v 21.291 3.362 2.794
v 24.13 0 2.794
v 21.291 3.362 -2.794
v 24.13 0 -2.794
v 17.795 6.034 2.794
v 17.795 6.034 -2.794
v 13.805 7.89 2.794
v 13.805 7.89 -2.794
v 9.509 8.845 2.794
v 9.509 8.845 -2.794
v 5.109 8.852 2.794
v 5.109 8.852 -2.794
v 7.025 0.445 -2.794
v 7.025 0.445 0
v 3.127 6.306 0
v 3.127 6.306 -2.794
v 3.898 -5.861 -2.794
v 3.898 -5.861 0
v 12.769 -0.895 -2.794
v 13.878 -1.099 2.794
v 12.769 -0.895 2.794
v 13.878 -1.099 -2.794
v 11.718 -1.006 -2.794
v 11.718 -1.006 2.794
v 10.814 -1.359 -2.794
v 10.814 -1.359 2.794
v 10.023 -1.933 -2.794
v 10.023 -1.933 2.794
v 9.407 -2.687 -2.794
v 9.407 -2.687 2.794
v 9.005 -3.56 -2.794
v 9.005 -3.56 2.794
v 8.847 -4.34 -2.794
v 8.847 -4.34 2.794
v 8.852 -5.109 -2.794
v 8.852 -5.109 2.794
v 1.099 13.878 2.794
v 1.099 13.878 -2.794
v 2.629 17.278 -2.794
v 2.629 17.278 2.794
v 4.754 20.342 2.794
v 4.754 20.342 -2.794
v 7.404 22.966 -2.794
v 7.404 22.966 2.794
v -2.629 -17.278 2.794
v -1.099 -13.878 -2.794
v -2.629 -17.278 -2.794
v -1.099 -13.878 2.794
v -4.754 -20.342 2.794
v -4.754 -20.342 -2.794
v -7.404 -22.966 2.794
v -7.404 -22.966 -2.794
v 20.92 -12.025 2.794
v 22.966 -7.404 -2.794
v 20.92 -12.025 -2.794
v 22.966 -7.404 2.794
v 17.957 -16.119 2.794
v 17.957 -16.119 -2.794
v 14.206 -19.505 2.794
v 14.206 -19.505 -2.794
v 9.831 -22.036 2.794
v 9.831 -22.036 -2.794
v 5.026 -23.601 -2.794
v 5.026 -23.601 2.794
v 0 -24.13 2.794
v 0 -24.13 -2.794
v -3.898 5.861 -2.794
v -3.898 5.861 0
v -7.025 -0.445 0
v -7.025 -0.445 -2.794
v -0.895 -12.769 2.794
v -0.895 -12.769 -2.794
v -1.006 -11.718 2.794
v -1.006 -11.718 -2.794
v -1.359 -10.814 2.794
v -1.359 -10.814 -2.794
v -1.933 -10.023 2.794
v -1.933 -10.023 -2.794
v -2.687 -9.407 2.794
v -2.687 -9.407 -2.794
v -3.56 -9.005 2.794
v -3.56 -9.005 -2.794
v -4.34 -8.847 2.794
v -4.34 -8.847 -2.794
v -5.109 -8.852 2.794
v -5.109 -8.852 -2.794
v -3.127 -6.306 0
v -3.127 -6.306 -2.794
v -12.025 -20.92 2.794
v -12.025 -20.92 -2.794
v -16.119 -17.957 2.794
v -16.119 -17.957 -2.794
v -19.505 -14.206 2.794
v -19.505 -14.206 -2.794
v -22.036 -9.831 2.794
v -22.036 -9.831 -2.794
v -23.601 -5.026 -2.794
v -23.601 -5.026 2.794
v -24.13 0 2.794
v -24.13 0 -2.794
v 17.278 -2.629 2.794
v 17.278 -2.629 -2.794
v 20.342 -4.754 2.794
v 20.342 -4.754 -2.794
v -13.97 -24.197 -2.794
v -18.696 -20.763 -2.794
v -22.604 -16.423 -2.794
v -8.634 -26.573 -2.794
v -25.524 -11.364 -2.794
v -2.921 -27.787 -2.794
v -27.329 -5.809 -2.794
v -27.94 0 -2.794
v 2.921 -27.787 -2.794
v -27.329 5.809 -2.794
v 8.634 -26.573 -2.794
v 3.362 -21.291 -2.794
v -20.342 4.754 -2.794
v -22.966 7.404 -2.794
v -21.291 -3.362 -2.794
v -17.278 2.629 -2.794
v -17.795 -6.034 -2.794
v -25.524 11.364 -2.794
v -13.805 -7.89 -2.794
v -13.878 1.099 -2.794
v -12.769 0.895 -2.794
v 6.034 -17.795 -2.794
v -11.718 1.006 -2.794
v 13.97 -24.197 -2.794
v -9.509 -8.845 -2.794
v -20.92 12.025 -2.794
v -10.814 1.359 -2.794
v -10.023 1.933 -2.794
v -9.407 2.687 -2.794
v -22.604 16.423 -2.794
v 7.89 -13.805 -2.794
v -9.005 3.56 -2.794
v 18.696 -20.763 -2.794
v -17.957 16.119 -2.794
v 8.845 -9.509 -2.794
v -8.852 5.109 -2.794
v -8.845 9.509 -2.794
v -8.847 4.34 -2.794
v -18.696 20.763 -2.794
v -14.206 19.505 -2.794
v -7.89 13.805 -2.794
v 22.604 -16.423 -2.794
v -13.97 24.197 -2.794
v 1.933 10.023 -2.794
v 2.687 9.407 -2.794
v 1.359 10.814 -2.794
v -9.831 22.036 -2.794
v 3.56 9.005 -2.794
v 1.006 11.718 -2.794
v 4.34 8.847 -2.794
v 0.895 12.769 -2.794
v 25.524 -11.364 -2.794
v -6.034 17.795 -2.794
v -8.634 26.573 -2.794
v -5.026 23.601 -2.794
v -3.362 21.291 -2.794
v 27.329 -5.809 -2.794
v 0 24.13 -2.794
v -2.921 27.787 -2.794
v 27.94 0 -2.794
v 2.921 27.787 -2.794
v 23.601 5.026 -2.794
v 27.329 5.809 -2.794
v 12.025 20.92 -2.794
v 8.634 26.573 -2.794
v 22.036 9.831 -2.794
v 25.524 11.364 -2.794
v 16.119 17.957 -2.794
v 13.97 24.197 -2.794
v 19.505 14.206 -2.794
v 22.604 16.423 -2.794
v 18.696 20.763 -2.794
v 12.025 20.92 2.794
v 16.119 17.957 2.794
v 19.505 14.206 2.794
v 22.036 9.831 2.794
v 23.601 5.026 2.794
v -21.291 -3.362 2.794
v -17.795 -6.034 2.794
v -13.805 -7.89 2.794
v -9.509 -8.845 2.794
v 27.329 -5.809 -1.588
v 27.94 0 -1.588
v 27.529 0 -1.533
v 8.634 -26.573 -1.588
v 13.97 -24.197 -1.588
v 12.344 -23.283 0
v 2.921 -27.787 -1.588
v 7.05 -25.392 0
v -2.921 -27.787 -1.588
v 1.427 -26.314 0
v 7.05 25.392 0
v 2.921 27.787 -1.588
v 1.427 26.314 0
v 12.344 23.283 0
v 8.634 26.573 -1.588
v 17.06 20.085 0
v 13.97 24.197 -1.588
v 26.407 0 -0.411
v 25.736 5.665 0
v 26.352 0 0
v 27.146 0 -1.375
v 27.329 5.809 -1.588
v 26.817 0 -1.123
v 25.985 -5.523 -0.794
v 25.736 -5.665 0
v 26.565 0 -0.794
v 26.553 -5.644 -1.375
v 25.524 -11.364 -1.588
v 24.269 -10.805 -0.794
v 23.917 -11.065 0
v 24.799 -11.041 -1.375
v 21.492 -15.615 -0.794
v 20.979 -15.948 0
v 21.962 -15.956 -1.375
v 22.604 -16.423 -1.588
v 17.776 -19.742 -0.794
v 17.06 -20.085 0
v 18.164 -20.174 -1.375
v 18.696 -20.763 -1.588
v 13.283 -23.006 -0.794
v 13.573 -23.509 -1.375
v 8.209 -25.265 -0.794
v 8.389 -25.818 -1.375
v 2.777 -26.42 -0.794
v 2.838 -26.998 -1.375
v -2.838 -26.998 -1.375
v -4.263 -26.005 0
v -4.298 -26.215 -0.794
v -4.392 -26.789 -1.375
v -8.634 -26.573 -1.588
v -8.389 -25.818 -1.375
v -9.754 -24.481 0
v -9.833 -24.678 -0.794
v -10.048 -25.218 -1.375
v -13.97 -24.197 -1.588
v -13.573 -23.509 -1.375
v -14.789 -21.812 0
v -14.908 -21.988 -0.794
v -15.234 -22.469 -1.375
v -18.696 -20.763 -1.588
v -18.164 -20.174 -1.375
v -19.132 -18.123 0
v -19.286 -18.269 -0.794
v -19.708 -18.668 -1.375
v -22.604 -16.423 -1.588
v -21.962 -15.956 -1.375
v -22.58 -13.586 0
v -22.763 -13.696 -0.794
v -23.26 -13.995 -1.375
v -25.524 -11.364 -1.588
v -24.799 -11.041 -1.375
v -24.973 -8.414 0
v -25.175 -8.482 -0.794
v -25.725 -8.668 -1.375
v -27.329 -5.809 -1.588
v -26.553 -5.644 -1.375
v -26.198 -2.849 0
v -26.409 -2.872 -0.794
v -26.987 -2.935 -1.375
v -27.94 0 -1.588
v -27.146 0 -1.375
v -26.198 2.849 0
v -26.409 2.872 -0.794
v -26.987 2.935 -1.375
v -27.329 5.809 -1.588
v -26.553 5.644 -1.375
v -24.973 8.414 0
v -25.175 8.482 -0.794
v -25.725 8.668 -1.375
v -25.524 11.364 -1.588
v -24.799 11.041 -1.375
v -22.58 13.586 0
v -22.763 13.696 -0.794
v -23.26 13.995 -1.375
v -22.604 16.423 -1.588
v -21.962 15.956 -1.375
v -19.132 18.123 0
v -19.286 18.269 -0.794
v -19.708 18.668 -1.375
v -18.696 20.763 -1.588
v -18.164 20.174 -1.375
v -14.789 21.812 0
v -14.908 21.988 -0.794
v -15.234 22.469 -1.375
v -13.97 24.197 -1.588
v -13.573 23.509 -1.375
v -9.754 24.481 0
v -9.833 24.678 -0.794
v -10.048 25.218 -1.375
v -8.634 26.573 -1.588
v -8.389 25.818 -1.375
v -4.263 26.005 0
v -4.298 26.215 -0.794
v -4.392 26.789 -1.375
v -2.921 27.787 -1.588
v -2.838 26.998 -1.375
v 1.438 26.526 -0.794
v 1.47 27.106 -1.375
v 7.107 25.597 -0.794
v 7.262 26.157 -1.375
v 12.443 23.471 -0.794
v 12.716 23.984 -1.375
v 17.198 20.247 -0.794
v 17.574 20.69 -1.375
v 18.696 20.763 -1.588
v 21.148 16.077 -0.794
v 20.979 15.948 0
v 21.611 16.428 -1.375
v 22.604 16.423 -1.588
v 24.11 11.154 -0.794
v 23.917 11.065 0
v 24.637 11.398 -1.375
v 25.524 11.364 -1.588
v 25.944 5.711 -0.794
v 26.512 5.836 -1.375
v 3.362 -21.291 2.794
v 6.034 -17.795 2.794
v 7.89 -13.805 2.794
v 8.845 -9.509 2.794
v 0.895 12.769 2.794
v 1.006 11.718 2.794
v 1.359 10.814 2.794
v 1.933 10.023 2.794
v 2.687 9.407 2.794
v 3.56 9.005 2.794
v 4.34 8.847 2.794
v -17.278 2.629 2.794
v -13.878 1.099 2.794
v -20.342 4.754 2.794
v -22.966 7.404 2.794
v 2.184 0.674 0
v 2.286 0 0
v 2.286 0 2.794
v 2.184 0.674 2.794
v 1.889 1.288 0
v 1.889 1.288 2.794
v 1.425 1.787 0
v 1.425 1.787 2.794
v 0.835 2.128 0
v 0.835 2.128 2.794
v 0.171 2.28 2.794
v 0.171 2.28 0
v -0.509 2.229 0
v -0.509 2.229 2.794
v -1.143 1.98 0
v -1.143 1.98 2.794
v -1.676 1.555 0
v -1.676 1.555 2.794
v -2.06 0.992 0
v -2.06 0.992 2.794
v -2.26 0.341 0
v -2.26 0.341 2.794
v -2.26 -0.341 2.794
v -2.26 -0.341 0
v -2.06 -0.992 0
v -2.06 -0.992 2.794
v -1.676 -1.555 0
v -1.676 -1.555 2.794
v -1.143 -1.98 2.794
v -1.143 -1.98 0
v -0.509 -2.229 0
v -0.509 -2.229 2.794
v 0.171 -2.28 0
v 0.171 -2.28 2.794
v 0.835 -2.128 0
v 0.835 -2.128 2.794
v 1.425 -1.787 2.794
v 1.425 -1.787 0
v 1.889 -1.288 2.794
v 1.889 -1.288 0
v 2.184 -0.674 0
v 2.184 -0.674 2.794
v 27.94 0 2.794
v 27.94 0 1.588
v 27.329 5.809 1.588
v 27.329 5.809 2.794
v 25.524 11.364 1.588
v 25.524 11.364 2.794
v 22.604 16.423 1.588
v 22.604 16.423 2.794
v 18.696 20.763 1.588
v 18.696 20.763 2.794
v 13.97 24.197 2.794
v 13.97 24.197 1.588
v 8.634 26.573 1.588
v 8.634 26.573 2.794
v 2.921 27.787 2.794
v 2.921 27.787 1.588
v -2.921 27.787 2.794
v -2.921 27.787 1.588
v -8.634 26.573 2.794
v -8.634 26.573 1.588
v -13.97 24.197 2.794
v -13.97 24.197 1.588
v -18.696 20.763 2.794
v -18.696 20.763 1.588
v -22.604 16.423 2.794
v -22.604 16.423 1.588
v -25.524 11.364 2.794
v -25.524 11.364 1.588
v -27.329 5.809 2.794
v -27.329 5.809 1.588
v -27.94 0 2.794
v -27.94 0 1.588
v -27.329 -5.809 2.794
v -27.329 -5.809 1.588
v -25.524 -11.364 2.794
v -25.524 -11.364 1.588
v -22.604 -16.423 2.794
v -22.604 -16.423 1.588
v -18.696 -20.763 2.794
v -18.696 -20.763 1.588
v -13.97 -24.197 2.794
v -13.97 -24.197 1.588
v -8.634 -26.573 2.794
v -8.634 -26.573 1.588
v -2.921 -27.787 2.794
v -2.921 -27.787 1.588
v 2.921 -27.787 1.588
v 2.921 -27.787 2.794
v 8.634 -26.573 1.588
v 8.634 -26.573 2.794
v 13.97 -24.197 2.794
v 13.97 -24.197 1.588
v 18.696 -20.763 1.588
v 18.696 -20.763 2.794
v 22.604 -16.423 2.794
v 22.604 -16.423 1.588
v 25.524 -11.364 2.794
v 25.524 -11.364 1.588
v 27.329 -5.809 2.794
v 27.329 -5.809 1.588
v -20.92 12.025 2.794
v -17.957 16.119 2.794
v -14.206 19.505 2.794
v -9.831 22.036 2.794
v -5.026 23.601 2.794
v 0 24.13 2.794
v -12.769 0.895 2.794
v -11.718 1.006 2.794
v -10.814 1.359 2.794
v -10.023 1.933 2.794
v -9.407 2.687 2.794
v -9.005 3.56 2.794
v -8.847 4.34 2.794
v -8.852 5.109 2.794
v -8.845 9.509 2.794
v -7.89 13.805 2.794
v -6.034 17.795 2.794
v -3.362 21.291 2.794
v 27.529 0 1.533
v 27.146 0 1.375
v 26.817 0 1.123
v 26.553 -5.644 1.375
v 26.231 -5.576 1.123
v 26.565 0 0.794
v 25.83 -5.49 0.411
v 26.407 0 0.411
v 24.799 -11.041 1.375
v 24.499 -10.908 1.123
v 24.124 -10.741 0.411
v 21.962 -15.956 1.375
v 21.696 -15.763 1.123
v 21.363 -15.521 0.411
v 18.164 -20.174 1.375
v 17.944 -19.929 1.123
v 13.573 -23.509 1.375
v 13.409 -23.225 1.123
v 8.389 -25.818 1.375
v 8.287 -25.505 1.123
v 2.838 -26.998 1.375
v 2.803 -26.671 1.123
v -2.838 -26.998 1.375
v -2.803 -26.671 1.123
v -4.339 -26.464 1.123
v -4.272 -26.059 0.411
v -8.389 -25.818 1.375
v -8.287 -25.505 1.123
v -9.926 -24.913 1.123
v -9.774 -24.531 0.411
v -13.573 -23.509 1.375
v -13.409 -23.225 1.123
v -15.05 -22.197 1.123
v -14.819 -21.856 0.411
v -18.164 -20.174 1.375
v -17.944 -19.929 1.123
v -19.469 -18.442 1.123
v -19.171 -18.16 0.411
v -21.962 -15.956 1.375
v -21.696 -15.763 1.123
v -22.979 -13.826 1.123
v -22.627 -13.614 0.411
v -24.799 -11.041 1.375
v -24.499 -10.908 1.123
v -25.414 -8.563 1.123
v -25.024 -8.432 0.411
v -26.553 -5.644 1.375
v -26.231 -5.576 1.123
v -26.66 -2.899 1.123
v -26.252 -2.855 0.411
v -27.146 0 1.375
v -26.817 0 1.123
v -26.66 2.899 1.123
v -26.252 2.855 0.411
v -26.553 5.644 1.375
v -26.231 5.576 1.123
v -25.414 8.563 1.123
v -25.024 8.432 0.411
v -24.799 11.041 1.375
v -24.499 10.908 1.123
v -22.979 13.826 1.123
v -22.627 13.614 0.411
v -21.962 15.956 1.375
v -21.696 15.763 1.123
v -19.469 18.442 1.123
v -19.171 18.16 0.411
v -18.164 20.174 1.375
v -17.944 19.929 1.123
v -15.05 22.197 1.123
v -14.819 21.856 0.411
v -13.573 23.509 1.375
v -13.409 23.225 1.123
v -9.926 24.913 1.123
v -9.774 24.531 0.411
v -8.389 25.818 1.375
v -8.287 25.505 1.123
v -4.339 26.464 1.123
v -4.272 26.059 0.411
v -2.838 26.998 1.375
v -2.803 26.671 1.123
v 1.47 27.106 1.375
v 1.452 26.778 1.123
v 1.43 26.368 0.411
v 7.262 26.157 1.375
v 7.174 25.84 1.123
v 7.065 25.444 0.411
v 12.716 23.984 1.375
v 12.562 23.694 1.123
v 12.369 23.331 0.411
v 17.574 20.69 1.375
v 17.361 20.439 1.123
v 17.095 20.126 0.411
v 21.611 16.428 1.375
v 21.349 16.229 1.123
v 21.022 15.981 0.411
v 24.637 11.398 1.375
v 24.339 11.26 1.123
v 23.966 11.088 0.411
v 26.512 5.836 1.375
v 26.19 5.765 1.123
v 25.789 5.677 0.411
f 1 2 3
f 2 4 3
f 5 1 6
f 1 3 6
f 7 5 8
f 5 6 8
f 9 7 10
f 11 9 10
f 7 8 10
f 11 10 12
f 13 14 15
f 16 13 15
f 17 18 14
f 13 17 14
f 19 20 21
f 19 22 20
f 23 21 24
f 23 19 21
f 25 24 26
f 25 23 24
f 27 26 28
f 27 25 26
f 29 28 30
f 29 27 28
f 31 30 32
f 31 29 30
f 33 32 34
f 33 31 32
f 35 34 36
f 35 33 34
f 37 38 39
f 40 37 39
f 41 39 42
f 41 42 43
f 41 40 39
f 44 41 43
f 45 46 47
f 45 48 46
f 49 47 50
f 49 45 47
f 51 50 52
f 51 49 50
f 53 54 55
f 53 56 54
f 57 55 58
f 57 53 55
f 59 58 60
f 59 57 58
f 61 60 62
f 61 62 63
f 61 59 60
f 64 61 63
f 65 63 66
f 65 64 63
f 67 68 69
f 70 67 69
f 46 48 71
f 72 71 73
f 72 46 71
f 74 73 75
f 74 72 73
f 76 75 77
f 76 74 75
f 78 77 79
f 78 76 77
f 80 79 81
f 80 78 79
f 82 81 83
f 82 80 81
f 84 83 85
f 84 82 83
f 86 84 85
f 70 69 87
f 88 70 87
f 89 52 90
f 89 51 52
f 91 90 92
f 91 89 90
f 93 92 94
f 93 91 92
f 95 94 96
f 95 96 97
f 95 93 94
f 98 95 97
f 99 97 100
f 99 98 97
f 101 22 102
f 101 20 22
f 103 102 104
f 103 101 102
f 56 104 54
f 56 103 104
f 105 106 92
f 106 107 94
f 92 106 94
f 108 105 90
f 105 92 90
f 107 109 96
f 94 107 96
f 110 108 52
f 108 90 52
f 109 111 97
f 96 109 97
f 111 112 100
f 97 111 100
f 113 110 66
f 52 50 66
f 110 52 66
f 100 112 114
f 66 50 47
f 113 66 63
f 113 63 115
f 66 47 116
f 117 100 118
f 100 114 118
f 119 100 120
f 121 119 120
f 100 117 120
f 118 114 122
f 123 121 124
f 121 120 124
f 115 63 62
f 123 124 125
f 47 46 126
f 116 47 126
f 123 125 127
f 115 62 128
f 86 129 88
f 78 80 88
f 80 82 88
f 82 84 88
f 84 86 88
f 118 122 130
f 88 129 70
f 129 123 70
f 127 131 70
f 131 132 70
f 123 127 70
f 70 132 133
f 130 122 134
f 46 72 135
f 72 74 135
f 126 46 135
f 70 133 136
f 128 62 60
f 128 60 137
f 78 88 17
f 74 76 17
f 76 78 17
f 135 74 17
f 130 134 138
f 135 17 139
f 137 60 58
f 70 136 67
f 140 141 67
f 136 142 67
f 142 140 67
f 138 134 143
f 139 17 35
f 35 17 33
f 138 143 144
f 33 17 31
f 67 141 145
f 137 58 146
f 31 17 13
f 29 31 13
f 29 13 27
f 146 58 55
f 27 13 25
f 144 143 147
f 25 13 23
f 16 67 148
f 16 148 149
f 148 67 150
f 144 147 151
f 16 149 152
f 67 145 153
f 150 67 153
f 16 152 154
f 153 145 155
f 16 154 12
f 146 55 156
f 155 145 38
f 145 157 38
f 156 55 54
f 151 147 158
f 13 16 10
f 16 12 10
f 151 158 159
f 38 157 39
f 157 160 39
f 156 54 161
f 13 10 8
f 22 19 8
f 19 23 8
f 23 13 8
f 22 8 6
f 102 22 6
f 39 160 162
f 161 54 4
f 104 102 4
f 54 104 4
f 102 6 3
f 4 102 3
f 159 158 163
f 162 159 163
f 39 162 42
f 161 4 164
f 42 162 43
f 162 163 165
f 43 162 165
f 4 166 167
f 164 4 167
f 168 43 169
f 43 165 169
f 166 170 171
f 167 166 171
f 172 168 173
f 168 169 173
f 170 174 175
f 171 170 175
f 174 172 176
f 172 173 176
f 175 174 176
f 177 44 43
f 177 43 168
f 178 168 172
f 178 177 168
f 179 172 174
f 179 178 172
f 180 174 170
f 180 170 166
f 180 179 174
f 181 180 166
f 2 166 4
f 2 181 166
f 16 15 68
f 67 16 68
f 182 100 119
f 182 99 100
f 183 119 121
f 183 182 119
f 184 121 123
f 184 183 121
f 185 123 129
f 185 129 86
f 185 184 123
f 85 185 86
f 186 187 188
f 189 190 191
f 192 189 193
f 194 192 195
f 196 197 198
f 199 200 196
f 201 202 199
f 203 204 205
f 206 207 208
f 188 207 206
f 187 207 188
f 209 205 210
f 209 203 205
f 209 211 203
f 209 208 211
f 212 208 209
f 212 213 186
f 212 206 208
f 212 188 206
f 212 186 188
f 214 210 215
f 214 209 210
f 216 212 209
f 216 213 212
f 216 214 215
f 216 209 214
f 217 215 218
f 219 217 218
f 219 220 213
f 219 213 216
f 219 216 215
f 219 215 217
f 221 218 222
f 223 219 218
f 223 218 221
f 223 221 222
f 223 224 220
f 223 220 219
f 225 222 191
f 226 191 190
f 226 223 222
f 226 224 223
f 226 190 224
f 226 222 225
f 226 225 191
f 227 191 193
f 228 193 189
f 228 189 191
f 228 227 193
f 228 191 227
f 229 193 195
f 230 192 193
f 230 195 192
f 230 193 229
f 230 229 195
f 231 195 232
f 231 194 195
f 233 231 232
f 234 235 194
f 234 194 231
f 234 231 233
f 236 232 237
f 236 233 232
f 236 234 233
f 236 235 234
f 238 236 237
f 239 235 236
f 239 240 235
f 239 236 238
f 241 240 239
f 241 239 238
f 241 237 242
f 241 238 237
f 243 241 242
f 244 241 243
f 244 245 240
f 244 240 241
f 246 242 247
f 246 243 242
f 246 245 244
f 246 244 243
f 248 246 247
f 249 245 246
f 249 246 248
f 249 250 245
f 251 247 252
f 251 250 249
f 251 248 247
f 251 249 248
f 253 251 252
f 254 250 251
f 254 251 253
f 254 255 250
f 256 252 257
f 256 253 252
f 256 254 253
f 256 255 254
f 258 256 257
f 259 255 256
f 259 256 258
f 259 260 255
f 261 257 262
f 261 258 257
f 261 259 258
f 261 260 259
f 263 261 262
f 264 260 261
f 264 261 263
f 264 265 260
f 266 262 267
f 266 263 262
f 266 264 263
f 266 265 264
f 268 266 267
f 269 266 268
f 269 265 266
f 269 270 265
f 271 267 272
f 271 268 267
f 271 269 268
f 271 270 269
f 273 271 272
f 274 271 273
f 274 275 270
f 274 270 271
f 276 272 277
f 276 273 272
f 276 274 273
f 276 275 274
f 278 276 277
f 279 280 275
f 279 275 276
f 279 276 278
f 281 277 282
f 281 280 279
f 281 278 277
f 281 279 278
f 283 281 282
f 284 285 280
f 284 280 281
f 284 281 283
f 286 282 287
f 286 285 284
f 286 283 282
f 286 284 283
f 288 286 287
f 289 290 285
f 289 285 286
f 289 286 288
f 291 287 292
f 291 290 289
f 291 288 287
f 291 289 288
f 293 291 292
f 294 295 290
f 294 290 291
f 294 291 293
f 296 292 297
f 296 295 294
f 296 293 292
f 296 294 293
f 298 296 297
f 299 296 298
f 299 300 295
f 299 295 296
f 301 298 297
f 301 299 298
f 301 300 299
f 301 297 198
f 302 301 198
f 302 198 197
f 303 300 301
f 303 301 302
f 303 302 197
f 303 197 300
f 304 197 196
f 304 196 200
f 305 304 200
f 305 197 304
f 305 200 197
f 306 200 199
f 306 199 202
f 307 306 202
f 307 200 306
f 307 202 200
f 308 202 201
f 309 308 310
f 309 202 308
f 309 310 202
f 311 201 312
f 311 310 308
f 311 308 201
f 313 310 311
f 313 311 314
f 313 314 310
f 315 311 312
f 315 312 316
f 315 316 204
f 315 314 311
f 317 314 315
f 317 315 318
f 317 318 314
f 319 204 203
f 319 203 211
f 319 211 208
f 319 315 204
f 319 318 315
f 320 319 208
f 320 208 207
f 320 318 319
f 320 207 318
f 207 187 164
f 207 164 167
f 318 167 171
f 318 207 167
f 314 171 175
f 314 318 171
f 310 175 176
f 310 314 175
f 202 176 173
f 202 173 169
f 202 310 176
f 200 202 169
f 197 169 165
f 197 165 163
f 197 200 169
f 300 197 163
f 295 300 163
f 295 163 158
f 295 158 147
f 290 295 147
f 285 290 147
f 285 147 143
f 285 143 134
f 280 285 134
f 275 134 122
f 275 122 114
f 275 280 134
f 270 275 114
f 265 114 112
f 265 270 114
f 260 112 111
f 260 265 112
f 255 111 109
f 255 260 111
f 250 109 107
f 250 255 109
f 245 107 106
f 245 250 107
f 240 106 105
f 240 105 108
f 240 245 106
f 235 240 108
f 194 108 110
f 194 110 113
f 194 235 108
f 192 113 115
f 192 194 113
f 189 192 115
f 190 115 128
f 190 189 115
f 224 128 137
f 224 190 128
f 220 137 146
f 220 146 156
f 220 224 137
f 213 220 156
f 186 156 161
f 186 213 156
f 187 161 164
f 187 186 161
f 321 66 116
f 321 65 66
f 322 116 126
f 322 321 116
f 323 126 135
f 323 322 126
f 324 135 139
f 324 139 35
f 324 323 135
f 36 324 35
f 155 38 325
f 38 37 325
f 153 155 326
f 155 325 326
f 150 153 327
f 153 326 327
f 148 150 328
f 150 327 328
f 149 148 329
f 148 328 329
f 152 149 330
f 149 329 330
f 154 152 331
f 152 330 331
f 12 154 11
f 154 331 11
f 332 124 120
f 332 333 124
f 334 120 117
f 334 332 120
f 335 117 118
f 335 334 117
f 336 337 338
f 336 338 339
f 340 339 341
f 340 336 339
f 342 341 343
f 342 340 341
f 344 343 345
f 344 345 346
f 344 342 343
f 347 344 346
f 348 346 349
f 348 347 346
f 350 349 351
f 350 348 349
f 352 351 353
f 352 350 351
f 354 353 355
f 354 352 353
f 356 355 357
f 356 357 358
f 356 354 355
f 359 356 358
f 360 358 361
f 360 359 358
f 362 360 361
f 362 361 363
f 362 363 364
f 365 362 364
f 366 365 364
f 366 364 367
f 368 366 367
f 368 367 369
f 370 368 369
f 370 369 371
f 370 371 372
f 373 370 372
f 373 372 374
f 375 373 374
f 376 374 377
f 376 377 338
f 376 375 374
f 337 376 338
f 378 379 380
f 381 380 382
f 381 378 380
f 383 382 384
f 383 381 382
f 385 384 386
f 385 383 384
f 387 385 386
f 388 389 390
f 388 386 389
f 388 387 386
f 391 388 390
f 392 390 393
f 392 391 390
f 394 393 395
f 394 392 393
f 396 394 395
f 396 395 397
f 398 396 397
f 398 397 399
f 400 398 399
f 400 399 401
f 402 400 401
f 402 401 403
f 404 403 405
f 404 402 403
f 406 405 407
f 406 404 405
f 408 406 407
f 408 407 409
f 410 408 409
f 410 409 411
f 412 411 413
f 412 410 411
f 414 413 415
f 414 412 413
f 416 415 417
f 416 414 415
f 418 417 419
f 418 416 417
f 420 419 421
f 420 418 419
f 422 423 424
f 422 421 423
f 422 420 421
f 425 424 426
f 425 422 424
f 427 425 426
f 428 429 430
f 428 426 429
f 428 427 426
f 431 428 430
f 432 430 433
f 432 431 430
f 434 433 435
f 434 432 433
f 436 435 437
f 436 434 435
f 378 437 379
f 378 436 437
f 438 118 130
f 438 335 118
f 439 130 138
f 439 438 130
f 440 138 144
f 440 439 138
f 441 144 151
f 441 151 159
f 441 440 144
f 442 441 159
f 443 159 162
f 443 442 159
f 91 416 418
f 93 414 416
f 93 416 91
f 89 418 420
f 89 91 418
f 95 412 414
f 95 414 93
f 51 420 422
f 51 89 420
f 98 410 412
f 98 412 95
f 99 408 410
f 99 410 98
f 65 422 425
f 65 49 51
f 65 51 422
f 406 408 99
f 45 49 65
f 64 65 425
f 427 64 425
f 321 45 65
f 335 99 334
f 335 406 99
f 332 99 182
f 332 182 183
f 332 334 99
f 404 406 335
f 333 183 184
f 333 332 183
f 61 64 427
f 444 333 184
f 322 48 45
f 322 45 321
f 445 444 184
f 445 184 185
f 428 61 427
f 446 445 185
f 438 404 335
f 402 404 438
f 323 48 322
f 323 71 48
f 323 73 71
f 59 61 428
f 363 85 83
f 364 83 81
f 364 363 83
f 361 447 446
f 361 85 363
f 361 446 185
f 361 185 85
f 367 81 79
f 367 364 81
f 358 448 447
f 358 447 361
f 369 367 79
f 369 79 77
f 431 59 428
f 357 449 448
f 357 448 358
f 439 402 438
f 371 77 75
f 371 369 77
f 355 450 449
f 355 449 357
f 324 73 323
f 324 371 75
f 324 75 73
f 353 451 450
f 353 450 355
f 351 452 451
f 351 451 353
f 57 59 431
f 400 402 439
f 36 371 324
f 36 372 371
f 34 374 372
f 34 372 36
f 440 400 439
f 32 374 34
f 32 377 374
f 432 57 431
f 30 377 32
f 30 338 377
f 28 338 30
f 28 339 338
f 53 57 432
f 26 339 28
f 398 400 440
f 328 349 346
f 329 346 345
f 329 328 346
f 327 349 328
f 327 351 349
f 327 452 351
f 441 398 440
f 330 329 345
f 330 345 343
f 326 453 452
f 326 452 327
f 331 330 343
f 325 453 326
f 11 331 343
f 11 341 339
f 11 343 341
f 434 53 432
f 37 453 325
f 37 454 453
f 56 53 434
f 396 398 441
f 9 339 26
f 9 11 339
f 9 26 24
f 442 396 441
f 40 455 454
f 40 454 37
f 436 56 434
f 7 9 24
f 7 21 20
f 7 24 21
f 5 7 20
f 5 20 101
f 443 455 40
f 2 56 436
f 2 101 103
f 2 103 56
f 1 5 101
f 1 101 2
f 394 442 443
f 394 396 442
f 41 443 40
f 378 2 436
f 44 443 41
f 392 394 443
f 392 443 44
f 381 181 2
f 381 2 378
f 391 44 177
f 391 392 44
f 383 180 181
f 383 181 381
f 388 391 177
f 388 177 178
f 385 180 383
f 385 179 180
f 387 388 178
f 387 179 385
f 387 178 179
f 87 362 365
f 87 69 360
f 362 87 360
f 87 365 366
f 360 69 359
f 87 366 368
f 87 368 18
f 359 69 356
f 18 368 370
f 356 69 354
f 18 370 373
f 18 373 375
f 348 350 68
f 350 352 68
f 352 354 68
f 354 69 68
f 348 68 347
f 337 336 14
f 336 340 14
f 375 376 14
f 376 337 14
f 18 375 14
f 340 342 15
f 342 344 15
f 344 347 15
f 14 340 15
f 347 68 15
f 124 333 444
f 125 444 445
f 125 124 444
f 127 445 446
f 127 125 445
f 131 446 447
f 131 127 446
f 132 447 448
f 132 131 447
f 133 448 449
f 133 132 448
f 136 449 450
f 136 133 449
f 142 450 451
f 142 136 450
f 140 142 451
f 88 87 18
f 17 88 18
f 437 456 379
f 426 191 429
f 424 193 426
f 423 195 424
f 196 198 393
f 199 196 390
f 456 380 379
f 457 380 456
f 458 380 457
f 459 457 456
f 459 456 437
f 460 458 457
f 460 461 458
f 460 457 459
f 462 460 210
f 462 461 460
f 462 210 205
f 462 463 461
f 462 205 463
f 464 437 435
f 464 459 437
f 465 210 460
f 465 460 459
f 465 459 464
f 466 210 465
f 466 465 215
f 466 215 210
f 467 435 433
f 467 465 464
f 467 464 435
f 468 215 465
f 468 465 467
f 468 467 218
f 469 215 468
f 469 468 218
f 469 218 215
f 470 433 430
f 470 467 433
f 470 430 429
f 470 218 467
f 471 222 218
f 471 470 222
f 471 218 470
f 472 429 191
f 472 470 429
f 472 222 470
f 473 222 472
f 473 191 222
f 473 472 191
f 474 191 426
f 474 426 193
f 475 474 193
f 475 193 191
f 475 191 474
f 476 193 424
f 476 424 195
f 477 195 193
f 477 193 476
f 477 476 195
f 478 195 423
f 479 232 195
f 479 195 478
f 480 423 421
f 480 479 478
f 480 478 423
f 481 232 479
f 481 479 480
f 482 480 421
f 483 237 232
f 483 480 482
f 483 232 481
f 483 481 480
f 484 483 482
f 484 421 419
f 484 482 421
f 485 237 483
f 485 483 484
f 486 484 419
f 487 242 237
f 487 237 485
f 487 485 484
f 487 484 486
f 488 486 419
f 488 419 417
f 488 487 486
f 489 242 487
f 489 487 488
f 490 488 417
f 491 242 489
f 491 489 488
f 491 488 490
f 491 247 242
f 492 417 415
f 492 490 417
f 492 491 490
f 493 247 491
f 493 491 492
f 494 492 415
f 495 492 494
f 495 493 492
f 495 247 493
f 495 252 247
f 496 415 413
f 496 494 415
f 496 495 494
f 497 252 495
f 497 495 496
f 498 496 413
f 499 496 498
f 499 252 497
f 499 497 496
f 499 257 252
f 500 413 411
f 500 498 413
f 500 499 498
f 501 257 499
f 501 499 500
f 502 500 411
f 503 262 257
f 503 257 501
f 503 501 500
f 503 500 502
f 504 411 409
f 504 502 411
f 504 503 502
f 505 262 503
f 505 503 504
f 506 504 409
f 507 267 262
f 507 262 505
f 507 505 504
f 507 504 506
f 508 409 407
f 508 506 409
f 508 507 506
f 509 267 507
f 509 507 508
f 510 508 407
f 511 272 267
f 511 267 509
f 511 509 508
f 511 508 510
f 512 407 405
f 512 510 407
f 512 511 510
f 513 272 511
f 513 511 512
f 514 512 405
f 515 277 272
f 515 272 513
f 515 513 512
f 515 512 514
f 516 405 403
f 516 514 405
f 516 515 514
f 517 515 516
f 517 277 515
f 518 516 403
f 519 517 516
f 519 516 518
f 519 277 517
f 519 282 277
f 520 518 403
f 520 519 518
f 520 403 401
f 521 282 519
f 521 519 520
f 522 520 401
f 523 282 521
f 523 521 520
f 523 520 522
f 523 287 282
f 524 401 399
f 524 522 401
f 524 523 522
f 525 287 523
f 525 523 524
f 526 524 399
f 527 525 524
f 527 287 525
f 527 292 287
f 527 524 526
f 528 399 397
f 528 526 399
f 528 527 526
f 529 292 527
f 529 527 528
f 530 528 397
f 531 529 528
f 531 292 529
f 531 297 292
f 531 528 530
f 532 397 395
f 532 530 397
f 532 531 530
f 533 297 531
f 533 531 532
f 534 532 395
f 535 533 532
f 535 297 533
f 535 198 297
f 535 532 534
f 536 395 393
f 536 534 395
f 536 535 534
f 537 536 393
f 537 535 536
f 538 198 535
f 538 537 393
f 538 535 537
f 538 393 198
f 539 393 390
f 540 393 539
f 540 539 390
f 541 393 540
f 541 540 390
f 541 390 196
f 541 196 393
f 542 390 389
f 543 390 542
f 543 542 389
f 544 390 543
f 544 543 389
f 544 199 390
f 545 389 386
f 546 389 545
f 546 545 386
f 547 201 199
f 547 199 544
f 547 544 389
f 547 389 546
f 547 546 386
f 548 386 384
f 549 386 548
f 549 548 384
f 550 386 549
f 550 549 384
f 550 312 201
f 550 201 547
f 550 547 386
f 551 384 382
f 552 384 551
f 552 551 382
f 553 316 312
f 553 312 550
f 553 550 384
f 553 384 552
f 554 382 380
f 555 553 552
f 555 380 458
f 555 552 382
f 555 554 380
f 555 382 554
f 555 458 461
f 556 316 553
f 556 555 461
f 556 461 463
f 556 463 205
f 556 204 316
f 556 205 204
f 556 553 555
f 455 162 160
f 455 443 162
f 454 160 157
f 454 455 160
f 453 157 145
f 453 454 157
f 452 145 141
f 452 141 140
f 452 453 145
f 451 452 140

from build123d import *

# Parameters (mm, degrees)
F0_R     = 27.94
F0_R_2   = 2.286
F1_DEPTH = 2.794
F4_R     = 3.81
F5_DEPTH = 12.7


# Not quite as in the source:
# - a feature names something its author has since deleted; it is built from what else it names


with BuildPart() as f1:
    # F0 (on Top) → F1 (new body, symmetric)
    with BuildSketch(Plane.XY):
        Circle(F0_R)
        with BuildLine():
            ThreePointArc((7.4038372238, 22.9660639719), (19.5052748277, 14.2056732996), (24.13, 0))
            ThreePointArc((24.13, 0), (23.8372400211, -3.7473841781), (22.9660639719, -7.4038372238))
            ThreePointArc((22.9660639719, -7.4038372238), (14.2056732996, -19.5052748277), (0, -24.13))
            ThreePointArc((0, -24.13), (-3.7473841781, -23.8372400211), (-7.4038372238, -22.9660639719))
            ThreePointArc((-7.4038372238, -22.9660639719), (-19.5052748277, -14.2056732996), (-24.13, 0))
            ThreePointArc((-24.13, 0), (-23.8372400211, 3.7473841781), (-22.9660639719, 7.4038372238))
            ThreePointArc((-22.9660639719, 7.4038372238), (-14.2056732996, 19.5052748277), (0, 24.13))
            ThreePointArc((0, 24.13), (3.7473841781, 23.8372400211), (7.4038372238, 22.9660639719))
        make_face(mode=Mode.SUBTRACT)
        with BuildLine():
            ThreePointArc((22.9660639719, -7.4038372238), (23.8372400211, -3.7473841781), (24.13, 0))
            ThreePointArc((24.13, 0), (13.395886303, 8.0244732927), (0, 7.62))
            ThreePointArc((0, 7.62), (2.0157431704, 16.1065414645), (7.4038372238, 22.9660639719))
            ThreePointArc((7.4038372238, 22.9660639719), (3.7473841781, 23.8372400211), (0, 24.13))
            ThreePointArc((0, 24.13), (-8.0244732927, 13.395886303), (-7.62, 0))
            ThreePointArc((-7.62, 0), (-16.1065414645, 2.0157431704), (-22.9660639719, 7.4038372238))
            ThreePointArc((-22.9660639719, 7.4038372238), (-23.8372400211, 3.7473841781), (-24.13, 0))
            ThreePointArc((-24.13, 0), (-13.395886303, -8.0244732927), (0, -7.62))
            ThreePointArc((0, -7.62), (-2.0157431704, -16.1065414645), (-7.4038372238, -22.9660639719))
            ThreePointArc((-7.4038372238, -22.9660639719), (-3.7473841781, -23.8372400211), (0, -24.13))
            ThreePointArc((0, -24.13), (8.0244732927, -13.395886303), (7.62, 0))
            ThreePointArc((7.62, 0), (16.1065414645, -2.0157431704), (22.9660639719, -7.4038372238))
        make_face()
        Polygon((3.1270369256, 6.3063403068), (7.0249693735, 0.4450767373), (3.8979324478, -5.8612635696), (-3.1270369256, -6.3063403068), (-7.0249693735, -0.4450767373), (-3.8979324478, 5.8612635696), align=None, mode=Mode.SUBTRACT)
        Polygon((3.8979324478, -5.8612635696), (7.0249693735, 0.4450767373), (3.1270369256, 6.3063403068), (-3.8979324478, 5.8612635696), (-7.0249693735, -0.4450767373), (-3.1270369256, -6.3063403068), align=None)
        Circle(F0_R_2, mode=Mode.SUBTRACT)
    extrude(amount=F1_DEPTH, both=True)

    # F2 (on Front) → F3 (revolve, cut)
    with BuildSketch(Plane.XZ):
        with BuildLine():
            Line((27.94, -1.5875), (27.94, 0))
            Line((27.94, 0), (26.3525, 0))
            ThreePointArc((26.3525, 0), (26.8174679849, -1.1225320151), (27.94, -1.5875))
        make_face()
        with BuildLine():
            Line((26.3525, 0), (27.94, 0))
            Line((27.94, 0), (27.94, 1.5875))
            ThreePointArc((27.94, 1.5875), (26.8174679849, 1.1225320151), (26.3525, 0))
        make_face()
    revolve(axis=Axis((0, 0, -0.2561928704), (0, 0, -1)), mode=Mode.SUBTRACT)

    # F4
    f4_edges = [f1.edges().sort_by_distance(p)[0] for p in [
        (-7.62, 0, 0),
        (0, 7.62, 0),
        (7.62, 0, 0),
        (0, -7.62, 0),
    ]]
    fillet(f4_edges, radius=F4_R)

    # F0 (on Top) → F5 (cut)
    with BuildSketch(Plane.XY):
        Polygon((3.8979324478, -5.8612635696), (7.0249693735, 0.4450767373), (3.1270369256, 6.3063403068), (-3.8979324478, 5.8612635696), (-7.0249693735, -0.4450767373), (-3.1270369256, -6.3063403068), align=None)
        Circle(F0_R_2, mode=Mode.SUBTRACT)
    extrude(amount=-F5_DEPTH, mode=Mode.SUBTRACT)


solid = f1.part
